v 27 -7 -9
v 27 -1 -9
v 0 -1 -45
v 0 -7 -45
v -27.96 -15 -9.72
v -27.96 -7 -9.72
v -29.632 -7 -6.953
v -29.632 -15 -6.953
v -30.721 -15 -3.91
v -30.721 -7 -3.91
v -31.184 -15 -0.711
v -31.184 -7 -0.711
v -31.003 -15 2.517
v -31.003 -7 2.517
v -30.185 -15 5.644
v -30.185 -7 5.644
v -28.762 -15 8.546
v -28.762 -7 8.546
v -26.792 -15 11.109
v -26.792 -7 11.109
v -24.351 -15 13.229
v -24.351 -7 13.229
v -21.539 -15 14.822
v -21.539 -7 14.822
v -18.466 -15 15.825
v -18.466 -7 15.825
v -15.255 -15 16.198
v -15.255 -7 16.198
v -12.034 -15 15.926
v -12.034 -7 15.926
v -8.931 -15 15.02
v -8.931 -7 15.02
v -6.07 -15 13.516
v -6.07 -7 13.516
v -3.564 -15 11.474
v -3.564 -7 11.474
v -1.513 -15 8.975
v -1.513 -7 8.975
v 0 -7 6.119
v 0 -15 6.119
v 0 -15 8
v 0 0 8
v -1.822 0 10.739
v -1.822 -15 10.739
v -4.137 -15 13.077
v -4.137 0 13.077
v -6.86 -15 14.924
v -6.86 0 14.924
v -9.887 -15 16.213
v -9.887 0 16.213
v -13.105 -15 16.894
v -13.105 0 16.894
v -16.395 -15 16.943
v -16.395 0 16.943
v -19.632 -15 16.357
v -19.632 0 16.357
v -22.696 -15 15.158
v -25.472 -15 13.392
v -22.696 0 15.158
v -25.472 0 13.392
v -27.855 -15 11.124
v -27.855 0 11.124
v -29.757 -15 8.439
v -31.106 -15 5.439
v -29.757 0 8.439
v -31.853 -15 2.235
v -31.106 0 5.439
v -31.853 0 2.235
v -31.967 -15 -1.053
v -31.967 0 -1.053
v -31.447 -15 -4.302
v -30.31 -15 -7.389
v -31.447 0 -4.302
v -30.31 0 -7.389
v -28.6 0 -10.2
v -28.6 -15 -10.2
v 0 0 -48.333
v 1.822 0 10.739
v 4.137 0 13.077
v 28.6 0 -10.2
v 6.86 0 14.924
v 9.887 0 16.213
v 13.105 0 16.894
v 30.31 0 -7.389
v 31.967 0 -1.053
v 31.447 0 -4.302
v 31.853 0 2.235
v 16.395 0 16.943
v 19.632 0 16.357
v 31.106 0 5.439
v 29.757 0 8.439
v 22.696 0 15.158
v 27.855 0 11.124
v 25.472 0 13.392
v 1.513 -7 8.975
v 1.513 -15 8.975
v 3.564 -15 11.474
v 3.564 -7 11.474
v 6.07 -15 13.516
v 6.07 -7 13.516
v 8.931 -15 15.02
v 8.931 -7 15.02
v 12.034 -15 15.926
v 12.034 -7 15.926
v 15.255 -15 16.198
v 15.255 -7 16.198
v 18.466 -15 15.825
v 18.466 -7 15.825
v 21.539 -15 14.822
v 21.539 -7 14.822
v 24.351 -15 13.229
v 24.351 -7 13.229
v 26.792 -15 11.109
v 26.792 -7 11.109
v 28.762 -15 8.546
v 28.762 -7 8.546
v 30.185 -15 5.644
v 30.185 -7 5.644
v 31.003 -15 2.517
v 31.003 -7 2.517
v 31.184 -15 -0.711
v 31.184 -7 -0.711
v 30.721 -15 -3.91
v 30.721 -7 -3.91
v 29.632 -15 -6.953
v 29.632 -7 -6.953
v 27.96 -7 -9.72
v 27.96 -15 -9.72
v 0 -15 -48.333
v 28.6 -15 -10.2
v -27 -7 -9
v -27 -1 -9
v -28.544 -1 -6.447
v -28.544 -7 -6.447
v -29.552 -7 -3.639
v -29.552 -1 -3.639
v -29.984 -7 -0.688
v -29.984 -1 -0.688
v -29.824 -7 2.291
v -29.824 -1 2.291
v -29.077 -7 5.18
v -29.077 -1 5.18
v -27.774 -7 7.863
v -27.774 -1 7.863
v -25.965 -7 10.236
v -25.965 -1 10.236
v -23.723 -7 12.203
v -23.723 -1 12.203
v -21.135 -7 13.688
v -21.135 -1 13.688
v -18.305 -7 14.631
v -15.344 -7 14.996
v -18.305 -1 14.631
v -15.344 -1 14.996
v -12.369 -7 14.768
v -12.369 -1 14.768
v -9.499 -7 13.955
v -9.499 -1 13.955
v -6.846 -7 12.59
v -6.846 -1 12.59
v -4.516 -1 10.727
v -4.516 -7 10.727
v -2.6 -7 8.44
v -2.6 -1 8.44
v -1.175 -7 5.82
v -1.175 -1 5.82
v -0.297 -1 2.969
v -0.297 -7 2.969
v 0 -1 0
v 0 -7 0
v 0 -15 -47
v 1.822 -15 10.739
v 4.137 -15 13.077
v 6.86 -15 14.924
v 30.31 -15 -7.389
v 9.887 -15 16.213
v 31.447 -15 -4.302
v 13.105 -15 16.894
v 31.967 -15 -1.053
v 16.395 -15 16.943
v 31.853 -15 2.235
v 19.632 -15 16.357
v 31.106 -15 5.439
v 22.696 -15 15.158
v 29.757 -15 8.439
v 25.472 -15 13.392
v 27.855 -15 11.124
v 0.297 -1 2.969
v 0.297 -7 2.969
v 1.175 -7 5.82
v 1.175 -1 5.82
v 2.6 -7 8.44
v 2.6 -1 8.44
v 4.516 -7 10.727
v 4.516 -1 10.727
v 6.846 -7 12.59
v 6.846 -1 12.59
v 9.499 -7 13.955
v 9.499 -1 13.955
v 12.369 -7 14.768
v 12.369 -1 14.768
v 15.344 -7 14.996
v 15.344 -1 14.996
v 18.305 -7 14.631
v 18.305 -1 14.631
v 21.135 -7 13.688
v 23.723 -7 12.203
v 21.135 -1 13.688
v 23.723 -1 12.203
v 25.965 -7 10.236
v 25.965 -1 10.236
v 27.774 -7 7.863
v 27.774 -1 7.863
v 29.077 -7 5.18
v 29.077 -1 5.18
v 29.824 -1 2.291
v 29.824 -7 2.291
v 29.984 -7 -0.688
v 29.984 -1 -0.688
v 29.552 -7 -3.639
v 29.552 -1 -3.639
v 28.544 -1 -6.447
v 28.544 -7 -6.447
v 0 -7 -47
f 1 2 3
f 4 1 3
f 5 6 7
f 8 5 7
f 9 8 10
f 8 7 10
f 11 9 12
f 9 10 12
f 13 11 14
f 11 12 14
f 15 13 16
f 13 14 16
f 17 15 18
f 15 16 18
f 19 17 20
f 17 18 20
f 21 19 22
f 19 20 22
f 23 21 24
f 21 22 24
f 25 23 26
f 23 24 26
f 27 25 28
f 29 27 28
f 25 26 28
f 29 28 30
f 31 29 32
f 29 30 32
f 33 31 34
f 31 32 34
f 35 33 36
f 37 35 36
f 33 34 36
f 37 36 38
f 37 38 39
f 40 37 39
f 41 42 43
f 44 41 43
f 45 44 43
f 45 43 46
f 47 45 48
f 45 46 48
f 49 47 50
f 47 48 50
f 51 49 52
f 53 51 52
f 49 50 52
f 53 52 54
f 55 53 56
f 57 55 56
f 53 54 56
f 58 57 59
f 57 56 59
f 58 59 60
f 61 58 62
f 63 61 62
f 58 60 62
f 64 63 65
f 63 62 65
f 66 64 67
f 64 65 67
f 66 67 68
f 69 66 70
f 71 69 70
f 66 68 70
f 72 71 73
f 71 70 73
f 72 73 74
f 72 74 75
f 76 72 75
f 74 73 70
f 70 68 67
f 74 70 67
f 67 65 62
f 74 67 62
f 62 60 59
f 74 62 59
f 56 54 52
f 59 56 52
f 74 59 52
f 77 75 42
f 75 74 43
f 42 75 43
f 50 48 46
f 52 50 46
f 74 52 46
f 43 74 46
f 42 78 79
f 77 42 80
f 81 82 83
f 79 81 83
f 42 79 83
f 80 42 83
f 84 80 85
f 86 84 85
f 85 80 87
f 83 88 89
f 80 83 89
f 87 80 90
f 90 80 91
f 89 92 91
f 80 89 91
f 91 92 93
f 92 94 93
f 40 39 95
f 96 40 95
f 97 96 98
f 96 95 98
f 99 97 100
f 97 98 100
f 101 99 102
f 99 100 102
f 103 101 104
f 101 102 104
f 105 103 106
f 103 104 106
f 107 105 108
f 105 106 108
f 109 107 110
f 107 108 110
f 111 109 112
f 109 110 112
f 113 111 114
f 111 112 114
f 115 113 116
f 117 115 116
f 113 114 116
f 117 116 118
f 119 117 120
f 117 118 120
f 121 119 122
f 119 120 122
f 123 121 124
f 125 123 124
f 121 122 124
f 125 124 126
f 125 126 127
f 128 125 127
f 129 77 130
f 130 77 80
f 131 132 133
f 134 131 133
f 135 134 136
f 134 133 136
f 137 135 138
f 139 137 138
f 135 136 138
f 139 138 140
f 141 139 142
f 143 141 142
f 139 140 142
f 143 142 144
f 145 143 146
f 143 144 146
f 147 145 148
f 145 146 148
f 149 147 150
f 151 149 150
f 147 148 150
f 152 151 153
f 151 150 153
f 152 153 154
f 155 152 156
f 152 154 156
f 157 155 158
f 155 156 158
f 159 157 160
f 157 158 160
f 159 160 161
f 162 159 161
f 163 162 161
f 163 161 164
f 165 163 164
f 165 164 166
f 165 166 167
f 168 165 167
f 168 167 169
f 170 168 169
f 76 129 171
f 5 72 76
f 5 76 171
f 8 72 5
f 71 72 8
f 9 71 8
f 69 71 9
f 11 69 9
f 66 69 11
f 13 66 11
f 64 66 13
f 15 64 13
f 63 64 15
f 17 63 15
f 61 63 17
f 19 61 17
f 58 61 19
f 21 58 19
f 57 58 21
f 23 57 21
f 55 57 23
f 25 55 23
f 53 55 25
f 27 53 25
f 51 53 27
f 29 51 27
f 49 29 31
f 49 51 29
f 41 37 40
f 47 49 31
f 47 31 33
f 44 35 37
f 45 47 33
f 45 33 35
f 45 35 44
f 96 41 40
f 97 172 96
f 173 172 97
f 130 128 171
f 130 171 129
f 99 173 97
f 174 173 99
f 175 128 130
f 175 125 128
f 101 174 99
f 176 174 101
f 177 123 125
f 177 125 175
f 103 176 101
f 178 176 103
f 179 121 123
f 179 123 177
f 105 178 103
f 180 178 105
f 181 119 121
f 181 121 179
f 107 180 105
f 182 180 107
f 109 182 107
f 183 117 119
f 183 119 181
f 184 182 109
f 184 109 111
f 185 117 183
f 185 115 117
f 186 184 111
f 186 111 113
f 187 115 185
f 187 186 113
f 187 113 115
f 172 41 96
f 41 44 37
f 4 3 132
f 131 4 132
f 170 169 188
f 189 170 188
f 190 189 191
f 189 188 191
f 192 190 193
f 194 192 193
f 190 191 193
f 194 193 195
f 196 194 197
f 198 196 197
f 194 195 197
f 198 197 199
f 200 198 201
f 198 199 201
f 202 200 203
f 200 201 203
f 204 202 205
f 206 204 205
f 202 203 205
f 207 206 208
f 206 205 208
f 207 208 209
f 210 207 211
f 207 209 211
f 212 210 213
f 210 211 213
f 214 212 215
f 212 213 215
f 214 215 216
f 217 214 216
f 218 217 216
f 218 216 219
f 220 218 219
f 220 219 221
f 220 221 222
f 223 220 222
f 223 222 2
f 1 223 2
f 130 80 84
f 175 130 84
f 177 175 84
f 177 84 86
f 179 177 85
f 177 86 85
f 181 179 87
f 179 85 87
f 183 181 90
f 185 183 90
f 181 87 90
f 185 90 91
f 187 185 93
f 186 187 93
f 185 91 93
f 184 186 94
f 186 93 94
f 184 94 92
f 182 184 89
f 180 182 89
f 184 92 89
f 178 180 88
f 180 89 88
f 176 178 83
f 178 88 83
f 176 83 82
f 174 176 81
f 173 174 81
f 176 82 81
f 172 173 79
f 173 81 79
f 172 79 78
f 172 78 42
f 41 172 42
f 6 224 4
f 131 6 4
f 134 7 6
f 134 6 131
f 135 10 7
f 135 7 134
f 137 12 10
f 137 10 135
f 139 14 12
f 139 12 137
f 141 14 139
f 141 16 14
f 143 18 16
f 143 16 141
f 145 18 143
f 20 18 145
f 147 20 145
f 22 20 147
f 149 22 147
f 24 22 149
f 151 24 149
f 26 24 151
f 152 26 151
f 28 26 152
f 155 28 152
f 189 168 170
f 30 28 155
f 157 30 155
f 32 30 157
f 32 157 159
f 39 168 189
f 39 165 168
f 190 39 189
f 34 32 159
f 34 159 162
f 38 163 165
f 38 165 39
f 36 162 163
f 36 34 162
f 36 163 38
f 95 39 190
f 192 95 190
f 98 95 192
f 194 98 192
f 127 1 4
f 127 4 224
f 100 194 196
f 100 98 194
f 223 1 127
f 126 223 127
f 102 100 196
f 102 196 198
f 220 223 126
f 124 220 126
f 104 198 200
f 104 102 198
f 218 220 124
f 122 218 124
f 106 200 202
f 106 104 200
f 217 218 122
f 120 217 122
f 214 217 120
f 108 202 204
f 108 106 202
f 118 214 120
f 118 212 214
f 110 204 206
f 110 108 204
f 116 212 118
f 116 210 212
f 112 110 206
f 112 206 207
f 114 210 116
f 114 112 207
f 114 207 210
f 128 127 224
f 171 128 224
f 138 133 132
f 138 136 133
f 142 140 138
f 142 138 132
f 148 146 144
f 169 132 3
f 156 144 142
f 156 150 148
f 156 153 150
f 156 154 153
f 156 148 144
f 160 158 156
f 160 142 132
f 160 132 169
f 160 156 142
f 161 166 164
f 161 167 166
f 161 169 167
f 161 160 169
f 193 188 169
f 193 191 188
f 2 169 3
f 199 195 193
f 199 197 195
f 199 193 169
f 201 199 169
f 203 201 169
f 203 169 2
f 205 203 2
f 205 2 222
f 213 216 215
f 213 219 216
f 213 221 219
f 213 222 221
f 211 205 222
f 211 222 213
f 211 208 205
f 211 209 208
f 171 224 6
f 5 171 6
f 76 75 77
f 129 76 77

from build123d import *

# Parameters (mm, degrees)
F1_DEPTH = 1
F2_DEPTH = 15
F3_DEPTH = 7


with BuildPart() as f1:
    # F0 (on Front) → F1 (new body)
    with BuildSketch(Plane.XZ):
        with BuildLine():
            ThreePointArc((28.6, -10.2), (24.1268833673, 14.3422452914), (0, 8))
            ThreePointArc((0, 8), (-24.1268833673, 14.3422452914), (-28.6, -10.2))
            Line((-28.6, -10.2), (0, -48.3333333333))
            Line((0, -48.3333333333), (28.6, -10.2))
        make_face()
        with BuildLine():
            ThreePointArc((0, 6.1188234163), (22.9848282263, 14.0954786438), (27.96, -9.72))
            Line((27.96, -9.72), (0, -47))
            Line((0, -47), (-27.96, -9.72))
            ThreePointArc((-27.96, -9.72), (-22.9848282263, 14.0954786438), (0, 6.1188234163))
        make_face(mode=Mode.SUBTRACT)
        with BuildLine():
            Line((0, -47), (27.96, -9.72))
            ThreePointArc((27.96, -9.72), (22.9848282263, 14.0954786438), (0, 6.1188234163))
            ThreePointArc((0, 6.1188234163), (-22.9848282263, 14.0954786438), (-27.96, -9.72))
            Line((-27.96, -9.72), (0, -47))
        make_face()
        with BuildLine():
            ThreePointArc((-27, -9), (-19.7434164903, 14.2302494708), (0, 0))
            ThreePointArc((0, 0), (19.7434164903, 14.2302494708), (27, -9))
            Line((27, -9), (0, -45))
            Line((0, -45), (-27, -9))
        make_face(mode=Mode.SUBTRACT)
        with BuildLine():
            ThreePointArc((27, -9), (19.7434164903, 14.2302494708), (0, 0))
            ThreePointArc((0, 0), (-19.7434164903, 14.2302494708), (-27, -9))
            Line((-27, -9), (0, -45))
            Line((0, -45), (27, -9))
        make_face()
    extrude(amount=F1_DEPTH)

    # F0 (on Front) → F2 (join)
    with BuildSketch(Plane.XZ):
        with BuildLine():
            ThreePointArc((28.6, -10.2), (24.1268833673, 14.3422452914), (0, 8))
            ThreePointArc((0, 8), (-24.1268833673, 14.3422452914), (-28.6, -10.2))
            Line((-28.6, -10.2), (0, -48.3333333333))
            Line((0, -48.3333333333), (28.6, -10.2))
        make_face()
        with BuildLine():
            ThreePointArc((0, 6.1188234163), (22.9848282263, 14.0954786438), (27.96, -9.72))
            Line((27.96, -9.72), (0, -47))
            Line((0, -47), (-27.96, -9.72))
            ThreePointArc((-27.96, -9.72), (-22.9848282263, 14.0954786438), (0, 6.1188234163))
        make_face(mode=Mode.SUBTRACT)
    extrude(amount=F2_DEPTH)

    # F0 (on Front) → F3 (join)
    with BuildSketch(Plane.XZ):
        with BuildLine():
            Line((0, -47), (27.96, -9.72))
            ThreePointArc((27.96, -9.72), (22.9848282263, 14.0954786438), (0, 6.1188234163))
            ThreePointArc((0, 6.1188234163), (-22.9848282263, 14.0954786438), (-27.96, -9.72))
            Line((-27.96, -9.72), (0, -47))
        make_face()
        with BuildLine():
            ThreePointArc((-27, -9), (-19.7434164903, 14.2302494708), (0, 0))
            ThreePointArc((0, 0), (19.7434164903, 14.2302494708), (27, -9))
            Line((27, -9), (0, -45))
            Line((0, -45), (-27, -9))
        make_face(mode=Mode.SUBTRACT)
    extrude(amount=F3_DEPTH)


solid = f1.part
